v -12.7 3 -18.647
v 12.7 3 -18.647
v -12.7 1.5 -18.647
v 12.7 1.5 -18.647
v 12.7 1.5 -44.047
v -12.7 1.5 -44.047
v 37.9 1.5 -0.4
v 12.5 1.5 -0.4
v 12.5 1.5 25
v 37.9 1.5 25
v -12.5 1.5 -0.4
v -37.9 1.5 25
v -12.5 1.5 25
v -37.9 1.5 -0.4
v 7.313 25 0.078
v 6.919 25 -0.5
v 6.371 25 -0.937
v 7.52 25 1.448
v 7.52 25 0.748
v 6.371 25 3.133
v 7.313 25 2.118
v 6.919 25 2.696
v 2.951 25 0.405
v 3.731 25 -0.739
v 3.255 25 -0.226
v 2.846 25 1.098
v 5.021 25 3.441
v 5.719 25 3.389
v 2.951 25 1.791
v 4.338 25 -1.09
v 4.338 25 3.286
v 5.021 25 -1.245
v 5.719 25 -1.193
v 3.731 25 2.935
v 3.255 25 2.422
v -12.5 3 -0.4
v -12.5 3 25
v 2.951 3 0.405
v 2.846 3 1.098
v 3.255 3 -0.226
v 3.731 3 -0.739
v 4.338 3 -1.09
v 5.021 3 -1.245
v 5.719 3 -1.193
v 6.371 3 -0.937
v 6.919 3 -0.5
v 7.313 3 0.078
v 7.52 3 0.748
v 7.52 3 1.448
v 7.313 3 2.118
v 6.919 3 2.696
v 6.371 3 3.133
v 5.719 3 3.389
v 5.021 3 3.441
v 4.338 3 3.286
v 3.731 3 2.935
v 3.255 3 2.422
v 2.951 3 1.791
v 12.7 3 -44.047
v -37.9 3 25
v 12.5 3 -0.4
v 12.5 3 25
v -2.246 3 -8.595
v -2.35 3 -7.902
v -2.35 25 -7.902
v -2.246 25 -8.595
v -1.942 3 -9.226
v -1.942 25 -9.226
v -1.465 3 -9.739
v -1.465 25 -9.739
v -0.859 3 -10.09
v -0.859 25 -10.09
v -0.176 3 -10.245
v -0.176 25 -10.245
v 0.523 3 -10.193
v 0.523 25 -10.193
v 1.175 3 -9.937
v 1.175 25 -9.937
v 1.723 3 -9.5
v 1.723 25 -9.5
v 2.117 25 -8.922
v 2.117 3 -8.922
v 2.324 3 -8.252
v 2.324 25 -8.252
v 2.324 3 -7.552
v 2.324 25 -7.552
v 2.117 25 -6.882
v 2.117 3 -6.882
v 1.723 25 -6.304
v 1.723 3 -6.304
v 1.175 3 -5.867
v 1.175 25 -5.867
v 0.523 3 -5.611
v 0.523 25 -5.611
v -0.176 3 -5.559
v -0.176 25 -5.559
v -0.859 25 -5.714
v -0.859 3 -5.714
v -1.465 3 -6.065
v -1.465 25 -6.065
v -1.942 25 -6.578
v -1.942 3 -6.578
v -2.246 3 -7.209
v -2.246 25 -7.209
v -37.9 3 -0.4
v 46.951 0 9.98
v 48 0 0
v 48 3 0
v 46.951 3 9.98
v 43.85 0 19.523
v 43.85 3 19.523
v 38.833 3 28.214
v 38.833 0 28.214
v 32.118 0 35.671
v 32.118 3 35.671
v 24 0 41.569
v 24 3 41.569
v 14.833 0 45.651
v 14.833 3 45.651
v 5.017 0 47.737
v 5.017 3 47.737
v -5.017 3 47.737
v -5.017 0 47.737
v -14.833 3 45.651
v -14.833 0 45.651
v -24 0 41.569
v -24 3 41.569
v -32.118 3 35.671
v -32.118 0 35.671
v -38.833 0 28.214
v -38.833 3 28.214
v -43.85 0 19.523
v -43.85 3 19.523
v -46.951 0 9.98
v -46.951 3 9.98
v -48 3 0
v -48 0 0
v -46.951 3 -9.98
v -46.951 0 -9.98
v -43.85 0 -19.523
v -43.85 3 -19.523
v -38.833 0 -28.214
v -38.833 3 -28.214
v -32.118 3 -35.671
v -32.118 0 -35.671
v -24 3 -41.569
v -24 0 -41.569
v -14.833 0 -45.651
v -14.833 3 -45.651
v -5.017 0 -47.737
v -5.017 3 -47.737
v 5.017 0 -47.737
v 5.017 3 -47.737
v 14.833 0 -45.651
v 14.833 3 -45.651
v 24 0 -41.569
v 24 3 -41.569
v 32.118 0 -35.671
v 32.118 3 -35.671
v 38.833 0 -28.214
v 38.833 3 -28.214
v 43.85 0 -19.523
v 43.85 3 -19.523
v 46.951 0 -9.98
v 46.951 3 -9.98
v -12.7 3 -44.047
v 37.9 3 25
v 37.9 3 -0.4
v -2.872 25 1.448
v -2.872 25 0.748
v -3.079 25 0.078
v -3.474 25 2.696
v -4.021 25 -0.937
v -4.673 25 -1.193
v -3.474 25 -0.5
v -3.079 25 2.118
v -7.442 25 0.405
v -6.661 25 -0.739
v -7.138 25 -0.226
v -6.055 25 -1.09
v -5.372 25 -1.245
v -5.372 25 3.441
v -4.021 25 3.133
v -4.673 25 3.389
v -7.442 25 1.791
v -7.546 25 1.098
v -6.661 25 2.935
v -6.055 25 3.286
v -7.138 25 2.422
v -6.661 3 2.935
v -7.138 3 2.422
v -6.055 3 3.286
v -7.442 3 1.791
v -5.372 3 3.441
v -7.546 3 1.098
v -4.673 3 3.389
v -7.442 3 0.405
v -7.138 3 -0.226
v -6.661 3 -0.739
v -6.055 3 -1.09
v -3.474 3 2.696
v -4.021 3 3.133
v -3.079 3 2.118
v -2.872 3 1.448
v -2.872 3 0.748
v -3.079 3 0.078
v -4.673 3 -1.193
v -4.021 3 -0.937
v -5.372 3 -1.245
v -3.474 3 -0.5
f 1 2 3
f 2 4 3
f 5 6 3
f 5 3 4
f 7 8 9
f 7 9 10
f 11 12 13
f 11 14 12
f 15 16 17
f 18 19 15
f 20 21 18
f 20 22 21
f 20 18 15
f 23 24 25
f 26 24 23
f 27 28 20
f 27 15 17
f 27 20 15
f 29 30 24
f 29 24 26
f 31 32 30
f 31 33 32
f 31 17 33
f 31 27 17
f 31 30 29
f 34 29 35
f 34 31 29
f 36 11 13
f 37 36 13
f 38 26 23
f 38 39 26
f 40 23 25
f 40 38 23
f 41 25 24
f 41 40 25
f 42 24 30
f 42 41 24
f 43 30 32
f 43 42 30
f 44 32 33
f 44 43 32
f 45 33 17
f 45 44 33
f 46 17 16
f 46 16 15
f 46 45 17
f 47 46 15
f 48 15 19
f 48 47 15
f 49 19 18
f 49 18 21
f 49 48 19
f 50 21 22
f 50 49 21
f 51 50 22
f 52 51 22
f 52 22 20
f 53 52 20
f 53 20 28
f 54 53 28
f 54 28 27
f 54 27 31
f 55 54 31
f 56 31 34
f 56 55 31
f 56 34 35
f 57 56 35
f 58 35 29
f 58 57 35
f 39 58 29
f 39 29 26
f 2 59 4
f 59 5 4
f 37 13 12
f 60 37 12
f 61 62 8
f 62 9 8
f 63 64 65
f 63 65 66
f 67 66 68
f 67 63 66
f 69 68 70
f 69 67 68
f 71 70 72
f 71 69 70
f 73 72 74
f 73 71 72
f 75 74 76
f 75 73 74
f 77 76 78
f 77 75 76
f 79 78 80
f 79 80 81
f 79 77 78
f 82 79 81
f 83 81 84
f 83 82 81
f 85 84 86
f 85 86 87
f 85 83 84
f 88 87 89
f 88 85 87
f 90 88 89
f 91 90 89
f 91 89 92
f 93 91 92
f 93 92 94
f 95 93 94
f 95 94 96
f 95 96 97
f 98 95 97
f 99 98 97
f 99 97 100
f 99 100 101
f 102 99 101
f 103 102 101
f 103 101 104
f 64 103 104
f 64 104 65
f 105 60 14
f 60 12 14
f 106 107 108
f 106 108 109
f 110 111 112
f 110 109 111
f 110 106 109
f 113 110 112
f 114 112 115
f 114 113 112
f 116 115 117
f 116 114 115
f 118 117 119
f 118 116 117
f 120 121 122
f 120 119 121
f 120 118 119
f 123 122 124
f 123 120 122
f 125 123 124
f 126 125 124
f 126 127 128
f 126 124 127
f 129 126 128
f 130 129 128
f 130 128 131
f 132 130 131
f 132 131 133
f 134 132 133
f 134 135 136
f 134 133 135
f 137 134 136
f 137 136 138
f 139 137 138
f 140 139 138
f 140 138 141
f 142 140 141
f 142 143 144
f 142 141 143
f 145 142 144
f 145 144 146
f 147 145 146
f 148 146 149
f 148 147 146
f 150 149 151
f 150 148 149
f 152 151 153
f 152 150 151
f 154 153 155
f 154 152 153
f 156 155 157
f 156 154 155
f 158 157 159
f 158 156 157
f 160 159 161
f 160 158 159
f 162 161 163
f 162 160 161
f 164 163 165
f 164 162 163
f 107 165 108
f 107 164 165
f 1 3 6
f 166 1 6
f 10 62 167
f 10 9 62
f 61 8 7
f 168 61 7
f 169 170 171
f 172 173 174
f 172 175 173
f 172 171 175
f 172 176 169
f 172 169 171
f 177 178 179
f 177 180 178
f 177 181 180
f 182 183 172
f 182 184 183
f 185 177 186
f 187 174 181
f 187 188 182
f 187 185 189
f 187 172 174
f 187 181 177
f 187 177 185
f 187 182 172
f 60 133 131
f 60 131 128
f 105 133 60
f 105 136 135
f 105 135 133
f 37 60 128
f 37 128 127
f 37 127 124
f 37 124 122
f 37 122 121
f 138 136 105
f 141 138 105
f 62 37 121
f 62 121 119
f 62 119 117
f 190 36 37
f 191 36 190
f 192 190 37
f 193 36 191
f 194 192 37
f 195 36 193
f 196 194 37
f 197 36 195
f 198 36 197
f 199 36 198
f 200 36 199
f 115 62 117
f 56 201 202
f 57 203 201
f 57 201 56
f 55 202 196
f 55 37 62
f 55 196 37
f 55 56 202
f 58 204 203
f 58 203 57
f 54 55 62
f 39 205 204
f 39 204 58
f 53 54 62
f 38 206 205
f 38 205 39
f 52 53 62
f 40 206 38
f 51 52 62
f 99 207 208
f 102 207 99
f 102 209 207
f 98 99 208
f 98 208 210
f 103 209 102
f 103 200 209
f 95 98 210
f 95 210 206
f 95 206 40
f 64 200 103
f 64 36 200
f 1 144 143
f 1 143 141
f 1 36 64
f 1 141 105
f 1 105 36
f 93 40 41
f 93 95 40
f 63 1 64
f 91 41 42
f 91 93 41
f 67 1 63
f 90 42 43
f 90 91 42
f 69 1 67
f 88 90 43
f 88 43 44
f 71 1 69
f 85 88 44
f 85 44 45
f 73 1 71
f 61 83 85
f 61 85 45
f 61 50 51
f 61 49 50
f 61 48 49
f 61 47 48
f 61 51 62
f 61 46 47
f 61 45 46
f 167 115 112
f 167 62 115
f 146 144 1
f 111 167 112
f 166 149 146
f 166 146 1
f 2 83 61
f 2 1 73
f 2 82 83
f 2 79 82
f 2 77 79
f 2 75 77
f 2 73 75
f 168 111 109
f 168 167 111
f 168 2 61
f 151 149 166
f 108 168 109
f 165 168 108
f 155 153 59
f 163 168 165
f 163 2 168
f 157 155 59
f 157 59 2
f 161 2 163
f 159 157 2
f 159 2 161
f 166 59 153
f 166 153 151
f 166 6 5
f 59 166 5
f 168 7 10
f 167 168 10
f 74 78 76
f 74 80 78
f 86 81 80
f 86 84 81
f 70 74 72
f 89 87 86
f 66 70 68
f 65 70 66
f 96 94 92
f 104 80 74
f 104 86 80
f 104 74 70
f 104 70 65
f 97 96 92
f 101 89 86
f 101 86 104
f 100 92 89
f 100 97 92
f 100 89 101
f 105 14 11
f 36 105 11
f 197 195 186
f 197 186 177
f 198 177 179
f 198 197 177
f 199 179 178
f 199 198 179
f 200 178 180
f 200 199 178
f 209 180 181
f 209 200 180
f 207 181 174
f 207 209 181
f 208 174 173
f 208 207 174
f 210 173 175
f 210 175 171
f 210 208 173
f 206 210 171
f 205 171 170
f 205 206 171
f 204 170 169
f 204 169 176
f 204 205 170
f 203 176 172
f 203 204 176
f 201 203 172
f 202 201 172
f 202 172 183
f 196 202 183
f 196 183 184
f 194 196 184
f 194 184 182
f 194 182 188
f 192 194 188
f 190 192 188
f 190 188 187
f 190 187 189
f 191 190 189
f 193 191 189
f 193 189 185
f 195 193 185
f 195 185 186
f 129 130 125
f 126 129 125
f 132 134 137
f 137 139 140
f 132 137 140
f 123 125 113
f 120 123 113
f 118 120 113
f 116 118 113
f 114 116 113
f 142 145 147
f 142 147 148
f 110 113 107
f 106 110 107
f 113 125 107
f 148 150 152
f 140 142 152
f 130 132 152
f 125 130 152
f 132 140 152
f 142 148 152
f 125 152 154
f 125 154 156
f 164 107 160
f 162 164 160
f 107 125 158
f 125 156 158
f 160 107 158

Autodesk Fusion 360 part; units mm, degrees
sketch "Sketch1" plane through (0, 0, 0) normal (0, 1, 0) x (1, 0, 0)
  line L0 (0, -25) -> (-12.5, -25)
  line L1 (-12.5, -25) -> (12.5, -25)
  line L2 (12.5, -25) -> (37.9, -25)
  circle A0 centre (0, 0) radius 48
  line L3 (37.9, -25) -> (12.5, -25)
  line L4 (12.5, -25) -> (12.5, 0.4)
  line L5 (12.5, 0.4) -> (37.9, 0.4)
  line L6 (37.9, 0.4) -> (37.9, -25)
  line L7 (-12.5, -25) -> (-37.9, -25)
  line L8 (-37.9, -25) -> (-37.9, 0.4)
  line L9 (-37.9, 0.4) -> (-12.5, 0.4)
  line L10 (-12.5, 0.4) -> (-12.5, -25)
  line L11 (-25.2, 0.4) -> (-25.2, -12.3)
  line L12 (12.5, 0.4) -> (25.2, 0.4)
  line L13 (25.2, 0.4) -> (25.2, -12.3)
  line L14 (-25.2, -12.3) -> (25.2, -12.3)
  line L15 (0, -12.3) -> (0, 31.347)
  line L16 (0, 31.347) -> (-25.2, -12.3)
  line L17 (25.2, -12.3) -> (0, 31.347)
  line L18 (0, 31.347) -> (0, 18.647)
  line L19 (0, 18.647) -> (12.7, 18.647)
  line L20 (12.7, 18.647) -> (-12.7, 18.647)
  line L21 (-12.7, 18.647) -> (-12.7, 44.047)
  line L22 (-12.7, 44.047) -> (12.7, 44.047)
  line L23 (12.7, 44.047) -> (12.7, 18.647)
  dimension "d2" = 12.5
  dimension "d3" = 25
  dimension "d4" = 25.4
  dimension "d5" = 96
  dimension "d6" = 25.4
  dimension "d7" = 25.4
  dimension "d8" = 25.4
  dimension "d9" = 25.4
  dimension "d10" = 12.7
  dimension "d11" = 12.7
  dimension "d12" = 12.7
  dimension "d13" = 43.647
  dimension "d14" = 12.7
  dimension "d15" = 12.7
  dimension "d16" = 25.4
  dimension "d17" = 25.4
extrude "Extrude1" add sketch "Sketch1" along normal blind 3 contours L0 L1 L4 L10 L14 | L9 L10 L14 L15 L16 L20 | L4 L5 L12 L14 L15 L17 L19 L20 | A0
extrude "Extrude2" add sketch "Sketch1" along normal blind 1.5 contours L7 L8 L9 L10 L11 L14 | L2 L3 L4 L5 L6 L13 L14 | L9 L10 L14 L16 | L4 L5 L12 L14 L17 | L9 L11 L16 | L5 L12 L13 L17 | L15 L16 L18 L20 | L15 L17 L18 L19 L20 | L16 L17 L19 L20 L21 L22 L23
sketch "Sketch2" plane through (0, 3, 0) normal (0, 1, 0) x (-1, 0, 0)
  line L0 (-12.5, 25) -> (-12.5, -0.4)
  line L1 (-12.5, -0.4) -> (-37.9, -0.4)
  line L2 (-37.9, -0.4) -> (-37.9, 25)
  line L3 (-37.9, 25) -> (-12.5, 25)
  line L4 (12.7, -44.047) -> (-12.7, -44.047)
  line L5 (-12.7, -44.047) -> (-12.7, -18.647)
  line L6 (-12.7, -18.647) -> (12.7, -18.647)
  line L7 (12.7, -18.647) -> (12.7, -44.047)
  line L8 (37.9, -0.4) -> (12.5, -0.4)
  line L9 (12.5, -0.4) -> (12.5, 25)
  line L10 (12.5, 25) -> (37.9, 25)
  line L11 (37.9, 25) -> (37.9, -0.4)
  circle A0 centre (0, 0) radius 48
  line L12 (0, -31) -> (0, -1.902)
  circle A1 centre (0, -1.902) radius 10.5
  line L13 (0, -1.902) -> (0, -7.902)
  line L14 (0, -1.902) -> (-5.1962, 1.098)
  line L15 (0, -1.902) -> (5.1962, 1.098)
  line L16 (0, -1.902) -> (6, -1.902) construction
  circle A2 centre (0, -7.902) radius 2.35
  circle A3 centre (5.1962, 1.098) radius 2.35
  circle A4 centre (-5.1962, 1.098) radius 2.35
  dimension "d22" = 29.098
  dimension "d23" = 21
  dimension "d24" = 6
  dimension "d25" = 60
  dimension "d26" = 6
  dimension "d27" = 30
  dimension "d28" = 6
  dimension "d29" = 4.7
  dimension "d30" = 4.7
  dimension "d31" = 4.7
extrude "Extrude3" add sketch "Sketch2" along normal blind 22 contours A4 | A3 | L12 L13 A2 | L12 L13 A2
